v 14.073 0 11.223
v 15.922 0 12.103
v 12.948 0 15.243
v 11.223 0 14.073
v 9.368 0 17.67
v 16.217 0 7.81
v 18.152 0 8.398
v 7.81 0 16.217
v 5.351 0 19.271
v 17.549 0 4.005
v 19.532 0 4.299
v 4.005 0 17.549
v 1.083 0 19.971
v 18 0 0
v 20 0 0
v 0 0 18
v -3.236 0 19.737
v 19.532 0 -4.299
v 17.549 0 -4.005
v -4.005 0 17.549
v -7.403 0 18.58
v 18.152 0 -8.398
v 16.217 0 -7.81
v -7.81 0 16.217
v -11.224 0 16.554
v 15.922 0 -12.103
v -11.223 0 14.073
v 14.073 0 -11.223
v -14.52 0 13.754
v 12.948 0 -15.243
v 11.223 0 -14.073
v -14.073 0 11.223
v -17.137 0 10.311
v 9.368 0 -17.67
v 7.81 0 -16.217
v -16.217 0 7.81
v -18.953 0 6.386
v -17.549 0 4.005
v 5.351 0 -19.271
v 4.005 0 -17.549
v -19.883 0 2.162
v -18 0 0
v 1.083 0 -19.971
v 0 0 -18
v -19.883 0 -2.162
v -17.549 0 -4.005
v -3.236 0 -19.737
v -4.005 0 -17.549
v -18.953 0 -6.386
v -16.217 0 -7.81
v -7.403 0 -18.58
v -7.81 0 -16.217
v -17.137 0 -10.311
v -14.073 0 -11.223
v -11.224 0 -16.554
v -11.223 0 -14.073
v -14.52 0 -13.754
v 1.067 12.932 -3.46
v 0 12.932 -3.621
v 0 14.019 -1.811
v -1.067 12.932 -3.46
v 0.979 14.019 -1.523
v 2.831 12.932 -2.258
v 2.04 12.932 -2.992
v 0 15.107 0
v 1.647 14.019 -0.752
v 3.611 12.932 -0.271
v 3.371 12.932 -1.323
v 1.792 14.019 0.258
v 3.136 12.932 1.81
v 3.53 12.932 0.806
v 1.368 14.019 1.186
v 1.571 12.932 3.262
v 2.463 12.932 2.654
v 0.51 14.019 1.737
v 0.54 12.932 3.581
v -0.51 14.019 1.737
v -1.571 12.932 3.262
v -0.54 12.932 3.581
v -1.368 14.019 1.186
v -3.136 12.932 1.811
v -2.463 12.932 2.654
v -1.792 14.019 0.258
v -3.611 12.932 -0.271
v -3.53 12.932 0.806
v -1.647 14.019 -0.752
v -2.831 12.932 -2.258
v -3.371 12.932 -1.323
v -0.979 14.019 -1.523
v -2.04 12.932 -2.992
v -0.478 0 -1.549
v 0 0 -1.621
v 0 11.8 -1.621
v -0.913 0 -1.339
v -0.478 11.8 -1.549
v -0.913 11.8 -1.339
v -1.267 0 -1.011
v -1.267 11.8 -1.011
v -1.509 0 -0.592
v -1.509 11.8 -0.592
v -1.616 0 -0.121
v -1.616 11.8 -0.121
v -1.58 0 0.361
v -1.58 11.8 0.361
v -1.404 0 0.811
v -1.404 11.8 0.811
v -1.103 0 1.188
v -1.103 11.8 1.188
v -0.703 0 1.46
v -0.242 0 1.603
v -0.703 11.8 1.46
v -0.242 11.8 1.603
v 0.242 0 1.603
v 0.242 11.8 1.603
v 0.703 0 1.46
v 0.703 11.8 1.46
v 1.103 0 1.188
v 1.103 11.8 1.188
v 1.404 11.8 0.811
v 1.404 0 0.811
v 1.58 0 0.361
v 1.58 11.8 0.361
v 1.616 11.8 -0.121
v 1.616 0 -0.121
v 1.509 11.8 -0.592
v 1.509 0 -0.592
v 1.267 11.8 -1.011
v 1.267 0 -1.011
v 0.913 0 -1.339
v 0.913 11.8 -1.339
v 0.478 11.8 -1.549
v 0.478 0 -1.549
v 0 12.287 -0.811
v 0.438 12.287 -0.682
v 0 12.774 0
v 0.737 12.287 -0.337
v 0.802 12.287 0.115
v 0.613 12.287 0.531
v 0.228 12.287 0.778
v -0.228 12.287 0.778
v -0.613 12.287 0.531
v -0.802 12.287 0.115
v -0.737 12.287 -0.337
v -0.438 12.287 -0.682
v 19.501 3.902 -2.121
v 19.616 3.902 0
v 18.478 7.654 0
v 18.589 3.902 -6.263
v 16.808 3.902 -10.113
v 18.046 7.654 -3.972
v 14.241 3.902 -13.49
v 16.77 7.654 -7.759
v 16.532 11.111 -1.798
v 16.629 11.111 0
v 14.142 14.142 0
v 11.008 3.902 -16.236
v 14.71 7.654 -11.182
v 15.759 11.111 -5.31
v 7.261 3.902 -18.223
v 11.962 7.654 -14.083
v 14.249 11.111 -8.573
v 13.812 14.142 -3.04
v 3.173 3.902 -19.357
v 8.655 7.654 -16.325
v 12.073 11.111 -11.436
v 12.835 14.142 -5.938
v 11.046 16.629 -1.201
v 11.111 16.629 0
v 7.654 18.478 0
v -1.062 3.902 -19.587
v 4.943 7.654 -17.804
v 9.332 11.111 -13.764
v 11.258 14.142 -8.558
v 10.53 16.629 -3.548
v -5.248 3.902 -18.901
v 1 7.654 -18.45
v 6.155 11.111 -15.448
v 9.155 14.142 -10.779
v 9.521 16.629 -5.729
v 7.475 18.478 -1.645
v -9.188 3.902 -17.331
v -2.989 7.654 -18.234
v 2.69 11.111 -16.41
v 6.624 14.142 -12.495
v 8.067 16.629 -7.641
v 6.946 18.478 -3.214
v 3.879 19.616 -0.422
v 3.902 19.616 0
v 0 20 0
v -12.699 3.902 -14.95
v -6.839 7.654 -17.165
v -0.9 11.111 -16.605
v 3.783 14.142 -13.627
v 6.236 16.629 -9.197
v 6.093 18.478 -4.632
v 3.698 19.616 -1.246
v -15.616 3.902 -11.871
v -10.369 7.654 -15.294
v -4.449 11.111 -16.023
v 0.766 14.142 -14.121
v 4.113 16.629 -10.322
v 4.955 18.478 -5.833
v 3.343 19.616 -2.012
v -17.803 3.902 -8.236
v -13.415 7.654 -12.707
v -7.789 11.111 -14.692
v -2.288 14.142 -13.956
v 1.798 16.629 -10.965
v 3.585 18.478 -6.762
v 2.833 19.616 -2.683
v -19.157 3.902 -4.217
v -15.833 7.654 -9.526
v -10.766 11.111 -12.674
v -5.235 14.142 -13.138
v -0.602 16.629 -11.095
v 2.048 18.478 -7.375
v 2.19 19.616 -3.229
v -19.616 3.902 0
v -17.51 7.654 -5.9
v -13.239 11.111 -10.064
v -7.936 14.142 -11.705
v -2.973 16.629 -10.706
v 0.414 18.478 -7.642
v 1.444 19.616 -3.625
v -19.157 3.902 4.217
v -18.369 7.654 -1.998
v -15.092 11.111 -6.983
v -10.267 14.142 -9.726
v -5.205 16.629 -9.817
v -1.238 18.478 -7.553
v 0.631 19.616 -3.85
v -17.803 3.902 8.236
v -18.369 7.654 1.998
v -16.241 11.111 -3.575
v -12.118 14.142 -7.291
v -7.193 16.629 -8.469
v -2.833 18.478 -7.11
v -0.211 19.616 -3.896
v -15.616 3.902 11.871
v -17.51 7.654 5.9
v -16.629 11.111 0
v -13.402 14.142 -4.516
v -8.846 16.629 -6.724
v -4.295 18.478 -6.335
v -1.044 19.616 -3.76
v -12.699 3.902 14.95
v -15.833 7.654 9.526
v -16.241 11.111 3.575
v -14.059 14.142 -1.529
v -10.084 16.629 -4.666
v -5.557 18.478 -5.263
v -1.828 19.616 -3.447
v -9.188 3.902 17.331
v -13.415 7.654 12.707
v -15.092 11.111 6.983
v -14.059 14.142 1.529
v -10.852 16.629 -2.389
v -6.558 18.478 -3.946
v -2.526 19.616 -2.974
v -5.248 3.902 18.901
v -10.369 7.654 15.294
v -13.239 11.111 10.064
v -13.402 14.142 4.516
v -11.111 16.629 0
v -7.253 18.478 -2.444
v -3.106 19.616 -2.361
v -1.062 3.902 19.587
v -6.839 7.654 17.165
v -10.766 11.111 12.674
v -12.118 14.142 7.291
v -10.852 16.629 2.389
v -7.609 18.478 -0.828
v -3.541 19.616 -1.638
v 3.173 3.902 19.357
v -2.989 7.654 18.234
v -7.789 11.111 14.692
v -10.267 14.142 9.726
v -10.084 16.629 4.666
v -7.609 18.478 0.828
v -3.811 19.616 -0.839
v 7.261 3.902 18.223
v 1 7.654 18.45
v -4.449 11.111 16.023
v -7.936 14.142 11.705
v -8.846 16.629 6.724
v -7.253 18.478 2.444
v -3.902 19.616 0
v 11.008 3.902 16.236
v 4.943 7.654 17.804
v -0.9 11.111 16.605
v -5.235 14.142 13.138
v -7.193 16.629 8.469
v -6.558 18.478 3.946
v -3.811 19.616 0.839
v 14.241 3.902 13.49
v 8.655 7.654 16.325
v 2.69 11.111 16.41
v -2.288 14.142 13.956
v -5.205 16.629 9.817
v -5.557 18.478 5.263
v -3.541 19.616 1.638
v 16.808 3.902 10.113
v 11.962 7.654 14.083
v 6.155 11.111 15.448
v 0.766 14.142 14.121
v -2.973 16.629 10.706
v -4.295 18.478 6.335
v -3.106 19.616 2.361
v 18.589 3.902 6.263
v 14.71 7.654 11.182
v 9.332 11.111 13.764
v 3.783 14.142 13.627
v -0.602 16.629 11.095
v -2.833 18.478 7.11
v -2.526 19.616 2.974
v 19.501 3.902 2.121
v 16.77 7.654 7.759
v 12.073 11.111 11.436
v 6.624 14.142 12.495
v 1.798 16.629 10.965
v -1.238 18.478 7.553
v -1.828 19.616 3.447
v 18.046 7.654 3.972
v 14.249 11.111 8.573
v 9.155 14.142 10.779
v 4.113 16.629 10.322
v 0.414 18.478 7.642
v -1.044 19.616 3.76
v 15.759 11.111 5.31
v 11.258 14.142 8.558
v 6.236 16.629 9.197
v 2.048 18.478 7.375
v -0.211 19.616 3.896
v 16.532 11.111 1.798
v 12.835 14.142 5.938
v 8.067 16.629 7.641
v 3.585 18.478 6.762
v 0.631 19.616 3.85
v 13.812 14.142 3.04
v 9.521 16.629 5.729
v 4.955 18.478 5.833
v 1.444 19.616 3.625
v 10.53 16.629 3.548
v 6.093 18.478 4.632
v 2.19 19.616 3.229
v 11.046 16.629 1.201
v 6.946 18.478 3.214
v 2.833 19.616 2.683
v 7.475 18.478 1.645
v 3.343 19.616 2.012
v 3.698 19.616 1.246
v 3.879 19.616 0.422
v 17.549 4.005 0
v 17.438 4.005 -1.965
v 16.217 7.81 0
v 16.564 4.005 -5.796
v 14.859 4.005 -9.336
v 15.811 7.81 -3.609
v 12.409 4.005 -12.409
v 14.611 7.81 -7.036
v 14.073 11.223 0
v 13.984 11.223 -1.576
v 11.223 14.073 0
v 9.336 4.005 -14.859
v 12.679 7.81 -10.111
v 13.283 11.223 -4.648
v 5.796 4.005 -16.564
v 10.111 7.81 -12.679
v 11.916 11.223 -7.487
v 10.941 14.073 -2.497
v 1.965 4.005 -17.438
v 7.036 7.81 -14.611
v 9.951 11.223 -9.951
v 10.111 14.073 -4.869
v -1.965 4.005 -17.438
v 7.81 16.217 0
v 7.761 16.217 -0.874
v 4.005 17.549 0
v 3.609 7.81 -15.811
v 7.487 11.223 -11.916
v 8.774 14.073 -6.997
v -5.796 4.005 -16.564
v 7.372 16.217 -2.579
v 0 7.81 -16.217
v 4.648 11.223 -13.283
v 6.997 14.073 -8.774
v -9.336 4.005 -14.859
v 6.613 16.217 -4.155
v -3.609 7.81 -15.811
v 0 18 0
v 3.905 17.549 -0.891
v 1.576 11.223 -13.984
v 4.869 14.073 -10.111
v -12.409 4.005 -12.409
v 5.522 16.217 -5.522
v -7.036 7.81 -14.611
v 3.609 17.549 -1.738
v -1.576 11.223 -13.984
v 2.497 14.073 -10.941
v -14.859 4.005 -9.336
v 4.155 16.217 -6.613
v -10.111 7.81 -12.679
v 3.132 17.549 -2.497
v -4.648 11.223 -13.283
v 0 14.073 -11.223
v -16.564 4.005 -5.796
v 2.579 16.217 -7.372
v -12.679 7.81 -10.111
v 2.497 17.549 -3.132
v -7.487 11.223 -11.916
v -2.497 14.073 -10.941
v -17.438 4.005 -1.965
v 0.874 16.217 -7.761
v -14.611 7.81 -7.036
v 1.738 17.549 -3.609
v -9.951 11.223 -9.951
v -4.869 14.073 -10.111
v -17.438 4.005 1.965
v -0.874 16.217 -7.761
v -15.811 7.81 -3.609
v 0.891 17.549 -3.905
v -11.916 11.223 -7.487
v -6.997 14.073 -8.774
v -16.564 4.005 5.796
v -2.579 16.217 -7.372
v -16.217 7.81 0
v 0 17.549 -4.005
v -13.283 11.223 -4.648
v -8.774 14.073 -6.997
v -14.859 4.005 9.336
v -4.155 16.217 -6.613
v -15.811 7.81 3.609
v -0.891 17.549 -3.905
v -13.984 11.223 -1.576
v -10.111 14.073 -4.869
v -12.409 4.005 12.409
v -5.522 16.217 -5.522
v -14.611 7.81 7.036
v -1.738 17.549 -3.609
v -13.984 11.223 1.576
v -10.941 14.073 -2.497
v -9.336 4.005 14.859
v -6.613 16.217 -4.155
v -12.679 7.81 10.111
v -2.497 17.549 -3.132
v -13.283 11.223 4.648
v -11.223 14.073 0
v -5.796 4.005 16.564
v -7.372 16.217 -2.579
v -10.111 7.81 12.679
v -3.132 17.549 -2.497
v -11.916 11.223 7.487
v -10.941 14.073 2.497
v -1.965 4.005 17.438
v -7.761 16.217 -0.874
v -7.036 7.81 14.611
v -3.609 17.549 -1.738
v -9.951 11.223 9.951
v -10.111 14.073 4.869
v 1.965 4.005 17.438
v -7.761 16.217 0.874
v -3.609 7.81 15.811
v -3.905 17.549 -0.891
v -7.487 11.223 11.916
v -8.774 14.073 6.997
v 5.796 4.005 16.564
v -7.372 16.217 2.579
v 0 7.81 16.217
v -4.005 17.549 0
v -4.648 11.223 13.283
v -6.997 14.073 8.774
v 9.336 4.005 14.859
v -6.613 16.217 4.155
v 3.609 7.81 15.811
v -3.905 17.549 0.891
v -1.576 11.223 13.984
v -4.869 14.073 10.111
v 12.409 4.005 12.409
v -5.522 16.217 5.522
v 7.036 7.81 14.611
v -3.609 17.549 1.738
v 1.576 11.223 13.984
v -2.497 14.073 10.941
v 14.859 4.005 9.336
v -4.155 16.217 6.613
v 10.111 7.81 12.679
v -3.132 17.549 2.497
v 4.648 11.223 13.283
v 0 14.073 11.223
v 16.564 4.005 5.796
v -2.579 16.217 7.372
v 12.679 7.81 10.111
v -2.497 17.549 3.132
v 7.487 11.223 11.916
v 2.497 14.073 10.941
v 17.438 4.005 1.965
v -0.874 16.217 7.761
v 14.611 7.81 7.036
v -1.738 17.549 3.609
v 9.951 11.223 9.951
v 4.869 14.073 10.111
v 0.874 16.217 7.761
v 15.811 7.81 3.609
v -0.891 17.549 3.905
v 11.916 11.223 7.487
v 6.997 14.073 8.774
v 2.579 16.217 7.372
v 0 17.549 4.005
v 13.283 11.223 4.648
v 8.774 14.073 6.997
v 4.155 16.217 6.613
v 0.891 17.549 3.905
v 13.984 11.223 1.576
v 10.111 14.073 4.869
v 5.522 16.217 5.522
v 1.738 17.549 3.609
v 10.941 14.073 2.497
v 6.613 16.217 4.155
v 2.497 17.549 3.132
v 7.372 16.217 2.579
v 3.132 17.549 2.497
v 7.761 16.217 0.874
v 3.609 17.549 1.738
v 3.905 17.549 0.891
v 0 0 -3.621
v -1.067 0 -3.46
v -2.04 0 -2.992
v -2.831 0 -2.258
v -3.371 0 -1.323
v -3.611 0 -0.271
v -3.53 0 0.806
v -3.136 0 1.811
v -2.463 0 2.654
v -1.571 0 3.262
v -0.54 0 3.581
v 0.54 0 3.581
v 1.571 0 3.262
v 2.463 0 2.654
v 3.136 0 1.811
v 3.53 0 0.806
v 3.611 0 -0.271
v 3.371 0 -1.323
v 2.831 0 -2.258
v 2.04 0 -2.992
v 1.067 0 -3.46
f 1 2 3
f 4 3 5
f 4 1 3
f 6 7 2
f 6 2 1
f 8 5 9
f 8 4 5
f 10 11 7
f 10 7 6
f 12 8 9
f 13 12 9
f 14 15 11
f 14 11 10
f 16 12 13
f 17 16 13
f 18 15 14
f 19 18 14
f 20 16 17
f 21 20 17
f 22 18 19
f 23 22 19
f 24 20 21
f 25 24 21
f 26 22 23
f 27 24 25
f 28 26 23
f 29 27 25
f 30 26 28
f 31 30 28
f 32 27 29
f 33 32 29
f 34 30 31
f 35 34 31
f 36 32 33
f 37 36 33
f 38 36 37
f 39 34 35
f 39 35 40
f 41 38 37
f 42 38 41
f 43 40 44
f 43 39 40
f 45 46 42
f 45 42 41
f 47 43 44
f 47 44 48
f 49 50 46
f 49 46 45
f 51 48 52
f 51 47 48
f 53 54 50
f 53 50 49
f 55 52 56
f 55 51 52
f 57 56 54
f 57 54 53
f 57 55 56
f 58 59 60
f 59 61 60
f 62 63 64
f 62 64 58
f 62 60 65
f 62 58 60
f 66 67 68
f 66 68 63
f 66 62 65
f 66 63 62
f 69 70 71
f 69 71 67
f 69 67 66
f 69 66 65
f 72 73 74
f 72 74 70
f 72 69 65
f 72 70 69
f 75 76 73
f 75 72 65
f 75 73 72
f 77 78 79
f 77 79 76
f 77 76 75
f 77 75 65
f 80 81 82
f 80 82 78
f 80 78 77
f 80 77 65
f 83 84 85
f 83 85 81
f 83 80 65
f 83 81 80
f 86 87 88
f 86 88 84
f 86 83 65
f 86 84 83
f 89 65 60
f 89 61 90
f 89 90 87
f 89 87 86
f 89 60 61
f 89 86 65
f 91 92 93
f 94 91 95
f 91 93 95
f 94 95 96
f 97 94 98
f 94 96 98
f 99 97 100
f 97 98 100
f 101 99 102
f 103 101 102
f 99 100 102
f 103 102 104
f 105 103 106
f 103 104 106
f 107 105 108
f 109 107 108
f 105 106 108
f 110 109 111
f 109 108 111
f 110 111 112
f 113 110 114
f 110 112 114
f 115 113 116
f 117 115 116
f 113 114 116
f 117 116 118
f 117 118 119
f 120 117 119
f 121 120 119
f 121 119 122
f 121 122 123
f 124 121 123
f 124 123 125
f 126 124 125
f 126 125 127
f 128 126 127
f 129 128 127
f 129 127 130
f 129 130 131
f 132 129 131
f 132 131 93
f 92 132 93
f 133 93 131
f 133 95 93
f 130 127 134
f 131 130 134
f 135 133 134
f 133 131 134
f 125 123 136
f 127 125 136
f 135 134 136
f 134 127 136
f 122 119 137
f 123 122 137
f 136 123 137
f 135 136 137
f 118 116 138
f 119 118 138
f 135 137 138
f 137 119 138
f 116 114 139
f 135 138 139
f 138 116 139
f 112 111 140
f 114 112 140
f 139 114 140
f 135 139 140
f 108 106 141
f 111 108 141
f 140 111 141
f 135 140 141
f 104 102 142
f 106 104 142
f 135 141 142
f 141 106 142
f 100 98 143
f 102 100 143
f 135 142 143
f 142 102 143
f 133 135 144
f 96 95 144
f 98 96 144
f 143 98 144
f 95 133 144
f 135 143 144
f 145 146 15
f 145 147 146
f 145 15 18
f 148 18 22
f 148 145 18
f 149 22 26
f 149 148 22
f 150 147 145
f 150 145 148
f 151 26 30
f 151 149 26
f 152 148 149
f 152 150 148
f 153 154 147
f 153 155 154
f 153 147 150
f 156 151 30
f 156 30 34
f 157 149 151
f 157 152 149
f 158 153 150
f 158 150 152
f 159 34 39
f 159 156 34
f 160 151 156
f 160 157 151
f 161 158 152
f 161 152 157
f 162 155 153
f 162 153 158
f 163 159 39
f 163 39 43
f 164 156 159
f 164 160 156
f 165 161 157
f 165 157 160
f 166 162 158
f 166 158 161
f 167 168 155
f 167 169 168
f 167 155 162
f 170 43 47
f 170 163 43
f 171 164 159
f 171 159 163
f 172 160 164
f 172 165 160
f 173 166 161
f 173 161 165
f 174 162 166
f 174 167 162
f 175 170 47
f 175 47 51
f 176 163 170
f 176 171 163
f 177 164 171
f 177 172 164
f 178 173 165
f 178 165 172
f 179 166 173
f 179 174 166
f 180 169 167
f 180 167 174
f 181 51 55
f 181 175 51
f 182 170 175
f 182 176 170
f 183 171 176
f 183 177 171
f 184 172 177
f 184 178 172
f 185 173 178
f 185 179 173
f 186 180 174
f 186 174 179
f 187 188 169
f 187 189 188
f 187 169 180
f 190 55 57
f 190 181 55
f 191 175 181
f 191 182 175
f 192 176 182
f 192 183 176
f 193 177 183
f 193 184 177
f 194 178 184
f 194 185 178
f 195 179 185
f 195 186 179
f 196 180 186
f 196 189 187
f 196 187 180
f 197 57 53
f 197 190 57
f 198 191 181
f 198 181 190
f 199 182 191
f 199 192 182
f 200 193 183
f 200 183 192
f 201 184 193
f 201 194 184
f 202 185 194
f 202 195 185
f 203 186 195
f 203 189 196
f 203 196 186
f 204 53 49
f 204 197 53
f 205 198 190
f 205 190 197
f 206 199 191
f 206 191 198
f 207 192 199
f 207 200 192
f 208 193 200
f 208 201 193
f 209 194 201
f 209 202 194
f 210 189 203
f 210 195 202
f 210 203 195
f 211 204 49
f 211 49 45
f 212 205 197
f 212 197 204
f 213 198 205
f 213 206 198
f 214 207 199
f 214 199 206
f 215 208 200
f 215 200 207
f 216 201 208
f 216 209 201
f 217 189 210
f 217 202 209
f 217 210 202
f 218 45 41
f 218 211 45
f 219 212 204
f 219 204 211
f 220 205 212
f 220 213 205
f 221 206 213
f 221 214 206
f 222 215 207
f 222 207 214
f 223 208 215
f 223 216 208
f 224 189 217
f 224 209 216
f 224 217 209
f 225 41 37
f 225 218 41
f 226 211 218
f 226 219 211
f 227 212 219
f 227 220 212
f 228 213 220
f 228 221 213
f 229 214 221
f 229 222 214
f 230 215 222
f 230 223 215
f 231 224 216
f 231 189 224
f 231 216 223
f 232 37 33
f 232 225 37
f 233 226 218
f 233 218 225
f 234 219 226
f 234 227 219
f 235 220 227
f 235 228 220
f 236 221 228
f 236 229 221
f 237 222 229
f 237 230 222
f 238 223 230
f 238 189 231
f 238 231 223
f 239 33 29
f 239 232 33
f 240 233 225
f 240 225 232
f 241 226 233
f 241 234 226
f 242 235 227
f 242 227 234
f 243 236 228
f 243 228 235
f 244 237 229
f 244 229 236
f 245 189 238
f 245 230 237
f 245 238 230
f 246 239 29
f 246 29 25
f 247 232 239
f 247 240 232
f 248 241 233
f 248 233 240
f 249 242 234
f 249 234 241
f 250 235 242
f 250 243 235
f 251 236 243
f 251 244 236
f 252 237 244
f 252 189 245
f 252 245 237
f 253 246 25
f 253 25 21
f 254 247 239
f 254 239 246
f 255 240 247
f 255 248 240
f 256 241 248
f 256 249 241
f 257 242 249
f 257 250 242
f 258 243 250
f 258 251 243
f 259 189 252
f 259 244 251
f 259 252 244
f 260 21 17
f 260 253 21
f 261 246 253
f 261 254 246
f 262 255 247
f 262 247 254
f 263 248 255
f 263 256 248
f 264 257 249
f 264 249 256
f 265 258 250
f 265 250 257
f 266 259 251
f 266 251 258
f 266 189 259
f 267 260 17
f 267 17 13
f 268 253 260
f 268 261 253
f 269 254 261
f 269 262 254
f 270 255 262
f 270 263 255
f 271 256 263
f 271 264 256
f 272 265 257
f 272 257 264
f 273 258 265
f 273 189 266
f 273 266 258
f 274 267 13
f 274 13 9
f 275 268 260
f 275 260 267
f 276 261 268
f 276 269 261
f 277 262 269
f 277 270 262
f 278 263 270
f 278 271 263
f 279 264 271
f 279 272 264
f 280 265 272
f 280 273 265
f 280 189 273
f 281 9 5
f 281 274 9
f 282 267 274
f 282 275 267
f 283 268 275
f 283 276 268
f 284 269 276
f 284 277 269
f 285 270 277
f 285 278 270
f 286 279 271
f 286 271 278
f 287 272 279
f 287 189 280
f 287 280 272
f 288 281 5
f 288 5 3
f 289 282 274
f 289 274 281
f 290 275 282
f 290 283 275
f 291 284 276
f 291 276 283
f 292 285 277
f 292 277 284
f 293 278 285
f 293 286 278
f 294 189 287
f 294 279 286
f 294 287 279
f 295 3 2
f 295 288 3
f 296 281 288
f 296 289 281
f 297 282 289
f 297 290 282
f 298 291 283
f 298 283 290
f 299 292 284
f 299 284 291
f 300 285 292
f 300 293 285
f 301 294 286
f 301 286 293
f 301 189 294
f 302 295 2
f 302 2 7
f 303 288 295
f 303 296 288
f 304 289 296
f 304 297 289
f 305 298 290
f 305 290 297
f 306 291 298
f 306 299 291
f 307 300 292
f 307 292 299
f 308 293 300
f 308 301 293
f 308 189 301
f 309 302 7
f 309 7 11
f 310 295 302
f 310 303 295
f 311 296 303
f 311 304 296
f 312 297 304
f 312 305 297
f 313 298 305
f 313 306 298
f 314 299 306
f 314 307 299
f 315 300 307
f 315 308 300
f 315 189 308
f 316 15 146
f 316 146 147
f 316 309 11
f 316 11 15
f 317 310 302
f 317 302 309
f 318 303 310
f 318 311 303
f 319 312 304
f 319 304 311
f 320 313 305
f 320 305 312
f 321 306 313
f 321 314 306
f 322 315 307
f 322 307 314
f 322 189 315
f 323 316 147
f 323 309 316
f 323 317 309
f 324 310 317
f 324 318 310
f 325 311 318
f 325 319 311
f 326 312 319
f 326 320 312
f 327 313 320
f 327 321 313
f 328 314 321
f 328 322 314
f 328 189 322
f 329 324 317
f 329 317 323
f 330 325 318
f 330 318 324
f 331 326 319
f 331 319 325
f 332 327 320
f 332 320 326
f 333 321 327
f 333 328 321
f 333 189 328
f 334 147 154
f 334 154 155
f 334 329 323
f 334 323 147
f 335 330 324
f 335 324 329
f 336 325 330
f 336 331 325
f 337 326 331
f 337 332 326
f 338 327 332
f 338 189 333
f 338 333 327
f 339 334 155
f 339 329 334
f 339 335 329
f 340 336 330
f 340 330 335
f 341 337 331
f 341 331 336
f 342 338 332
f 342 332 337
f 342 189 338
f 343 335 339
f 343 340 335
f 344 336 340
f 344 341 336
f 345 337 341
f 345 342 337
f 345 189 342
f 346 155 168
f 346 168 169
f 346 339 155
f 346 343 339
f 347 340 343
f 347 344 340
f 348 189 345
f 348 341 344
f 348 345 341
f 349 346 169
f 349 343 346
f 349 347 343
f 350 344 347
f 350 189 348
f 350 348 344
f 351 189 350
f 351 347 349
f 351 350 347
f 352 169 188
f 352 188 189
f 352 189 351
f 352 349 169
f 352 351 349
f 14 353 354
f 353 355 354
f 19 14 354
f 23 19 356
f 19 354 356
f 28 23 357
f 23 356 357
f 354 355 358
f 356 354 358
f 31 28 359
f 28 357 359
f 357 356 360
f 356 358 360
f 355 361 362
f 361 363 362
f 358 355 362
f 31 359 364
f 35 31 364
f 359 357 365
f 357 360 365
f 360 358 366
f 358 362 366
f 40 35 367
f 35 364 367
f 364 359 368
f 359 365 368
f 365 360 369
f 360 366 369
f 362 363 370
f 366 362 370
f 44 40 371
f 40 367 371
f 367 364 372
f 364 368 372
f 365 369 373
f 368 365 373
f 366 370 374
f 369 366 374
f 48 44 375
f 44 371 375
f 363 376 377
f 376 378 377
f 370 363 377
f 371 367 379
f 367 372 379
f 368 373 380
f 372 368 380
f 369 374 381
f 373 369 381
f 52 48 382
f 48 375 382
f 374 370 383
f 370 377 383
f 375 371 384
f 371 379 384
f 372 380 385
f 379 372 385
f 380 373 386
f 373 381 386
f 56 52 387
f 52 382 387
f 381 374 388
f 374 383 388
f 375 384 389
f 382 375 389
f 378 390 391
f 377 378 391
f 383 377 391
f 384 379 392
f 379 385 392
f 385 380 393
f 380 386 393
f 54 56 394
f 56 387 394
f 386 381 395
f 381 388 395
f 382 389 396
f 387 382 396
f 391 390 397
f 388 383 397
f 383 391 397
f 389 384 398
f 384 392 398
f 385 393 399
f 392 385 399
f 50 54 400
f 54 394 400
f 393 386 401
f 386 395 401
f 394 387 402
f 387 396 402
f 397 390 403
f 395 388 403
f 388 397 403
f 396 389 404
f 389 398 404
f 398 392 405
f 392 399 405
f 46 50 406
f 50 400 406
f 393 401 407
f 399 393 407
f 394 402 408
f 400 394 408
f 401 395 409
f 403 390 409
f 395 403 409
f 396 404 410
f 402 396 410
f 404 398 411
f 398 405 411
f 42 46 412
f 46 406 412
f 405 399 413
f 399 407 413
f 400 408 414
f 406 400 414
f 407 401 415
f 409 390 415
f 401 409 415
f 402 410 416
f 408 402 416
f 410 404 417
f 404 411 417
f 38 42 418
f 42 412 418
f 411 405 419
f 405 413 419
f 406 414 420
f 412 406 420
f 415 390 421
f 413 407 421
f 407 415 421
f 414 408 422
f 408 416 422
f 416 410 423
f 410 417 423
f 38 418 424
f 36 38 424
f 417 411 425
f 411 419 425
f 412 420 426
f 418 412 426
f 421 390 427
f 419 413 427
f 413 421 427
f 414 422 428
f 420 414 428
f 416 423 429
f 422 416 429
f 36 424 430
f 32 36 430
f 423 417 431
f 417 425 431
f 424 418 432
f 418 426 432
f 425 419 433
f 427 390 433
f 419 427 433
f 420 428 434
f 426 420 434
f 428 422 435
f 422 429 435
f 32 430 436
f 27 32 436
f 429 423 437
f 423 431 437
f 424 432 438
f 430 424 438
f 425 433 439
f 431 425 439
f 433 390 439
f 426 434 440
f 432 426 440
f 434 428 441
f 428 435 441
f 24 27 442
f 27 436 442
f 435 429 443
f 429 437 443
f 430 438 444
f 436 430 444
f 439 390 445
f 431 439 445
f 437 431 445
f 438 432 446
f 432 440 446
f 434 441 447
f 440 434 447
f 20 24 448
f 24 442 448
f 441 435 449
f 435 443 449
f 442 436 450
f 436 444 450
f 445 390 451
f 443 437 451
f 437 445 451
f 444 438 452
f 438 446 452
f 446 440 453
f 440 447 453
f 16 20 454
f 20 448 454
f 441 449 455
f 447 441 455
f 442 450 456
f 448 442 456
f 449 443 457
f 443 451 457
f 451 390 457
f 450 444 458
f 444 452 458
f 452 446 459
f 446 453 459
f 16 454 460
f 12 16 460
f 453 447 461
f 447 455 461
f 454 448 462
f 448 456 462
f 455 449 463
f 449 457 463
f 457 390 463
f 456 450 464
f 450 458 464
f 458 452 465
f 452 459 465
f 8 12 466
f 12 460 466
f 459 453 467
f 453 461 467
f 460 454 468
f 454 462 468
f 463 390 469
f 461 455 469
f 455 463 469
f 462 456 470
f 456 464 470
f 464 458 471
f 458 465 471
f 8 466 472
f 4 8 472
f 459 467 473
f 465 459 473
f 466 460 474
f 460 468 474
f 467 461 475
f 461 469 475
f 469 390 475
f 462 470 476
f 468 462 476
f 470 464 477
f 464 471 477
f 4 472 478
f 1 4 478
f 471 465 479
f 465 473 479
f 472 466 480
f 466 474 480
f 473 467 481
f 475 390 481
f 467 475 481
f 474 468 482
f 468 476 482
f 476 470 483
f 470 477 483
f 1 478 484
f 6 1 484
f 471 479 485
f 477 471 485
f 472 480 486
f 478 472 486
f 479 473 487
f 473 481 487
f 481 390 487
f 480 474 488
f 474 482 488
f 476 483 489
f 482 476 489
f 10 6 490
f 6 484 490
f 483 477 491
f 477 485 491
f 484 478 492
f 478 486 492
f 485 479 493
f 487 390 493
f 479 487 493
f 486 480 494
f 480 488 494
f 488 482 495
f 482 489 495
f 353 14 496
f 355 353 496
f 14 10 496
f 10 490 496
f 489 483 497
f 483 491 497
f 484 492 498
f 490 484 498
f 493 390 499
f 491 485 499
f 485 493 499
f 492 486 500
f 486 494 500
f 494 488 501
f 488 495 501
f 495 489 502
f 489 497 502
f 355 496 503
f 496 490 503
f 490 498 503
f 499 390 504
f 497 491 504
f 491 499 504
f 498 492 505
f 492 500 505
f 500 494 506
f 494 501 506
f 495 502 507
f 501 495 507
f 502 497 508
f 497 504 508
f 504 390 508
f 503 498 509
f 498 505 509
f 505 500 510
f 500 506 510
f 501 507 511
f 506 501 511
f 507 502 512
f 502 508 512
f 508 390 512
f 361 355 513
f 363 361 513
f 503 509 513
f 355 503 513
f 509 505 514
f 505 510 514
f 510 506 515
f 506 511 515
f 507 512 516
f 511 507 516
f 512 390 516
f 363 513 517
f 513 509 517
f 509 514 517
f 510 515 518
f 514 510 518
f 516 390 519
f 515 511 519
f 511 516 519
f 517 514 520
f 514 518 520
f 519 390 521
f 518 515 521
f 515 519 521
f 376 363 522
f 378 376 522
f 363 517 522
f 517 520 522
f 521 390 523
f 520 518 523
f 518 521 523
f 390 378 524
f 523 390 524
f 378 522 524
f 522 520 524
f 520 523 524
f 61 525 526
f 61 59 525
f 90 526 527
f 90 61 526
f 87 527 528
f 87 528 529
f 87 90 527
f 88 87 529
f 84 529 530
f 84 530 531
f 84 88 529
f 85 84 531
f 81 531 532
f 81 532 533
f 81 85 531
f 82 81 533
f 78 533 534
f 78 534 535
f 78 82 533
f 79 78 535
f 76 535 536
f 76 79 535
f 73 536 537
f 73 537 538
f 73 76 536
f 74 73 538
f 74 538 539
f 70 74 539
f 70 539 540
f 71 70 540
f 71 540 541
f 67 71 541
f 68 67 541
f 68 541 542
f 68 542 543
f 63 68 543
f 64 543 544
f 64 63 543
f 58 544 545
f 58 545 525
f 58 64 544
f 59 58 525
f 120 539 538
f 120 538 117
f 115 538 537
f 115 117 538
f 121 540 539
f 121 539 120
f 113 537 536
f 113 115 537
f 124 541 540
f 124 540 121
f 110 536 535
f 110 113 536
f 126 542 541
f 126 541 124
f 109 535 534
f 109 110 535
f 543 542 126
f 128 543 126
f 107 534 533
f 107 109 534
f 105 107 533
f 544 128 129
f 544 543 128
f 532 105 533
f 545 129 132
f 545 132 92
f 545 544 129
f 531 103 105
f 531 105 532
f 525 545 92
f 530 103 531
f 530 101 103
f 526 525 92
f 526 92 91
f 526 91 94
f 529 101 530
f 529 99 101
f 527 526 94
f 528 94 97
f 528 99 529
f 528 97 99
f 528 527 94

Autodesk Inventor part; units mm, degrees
ref_plane "YZ Plane" through (0, 0, 0) normal (1, 0, 0) x (0, 1, 0)
ref_plane "XZ Plane" through (0, 0, 0) normal (0, 1, 0) x (-1, 0, 0)
ref_plane "XY Plane" through (0, 0, 0) normal (0, 0, 1) x (1, 0, 0)
sketch "Sketch1" plane through (0, 0, 0) normal (0, 0, 1) x (1, 0, 0)
  line L0 (0, 0) -> (0, 20)
  line L1 (0, 0) -> (20, 0)
  arc A0 (20, 0) -> (0, 20) centre (0, 0) ccw
  line L2 (0, -4.8284) -> (0, 28.9706) projected
  dimension "d2" = 20
revolve "Revolution1" add sketch "Sketch1" angle 360 about axis through (0, -10, 0) along (0, 1, 0)
sketch "Sketch4" plane through (0, 0, 0) normal (0, -1, 0) x (1, 0, 0)
  point P0 (0, 0)
  point P1 (0, 0)
hole "Hole2" at (0, 0, 0) direction (0, 1, 0) diameter 3.242 depth 11.8 tip angle 118 thread size "M4x0.7" class "6H" standard "ANSI Metric M Profile"
shell "Shell2" thickness 2 removed faces 1 at (13.676, 0, 1.6606)
properties part number "Ball_Upper Half" material "Nylon 6/6"
